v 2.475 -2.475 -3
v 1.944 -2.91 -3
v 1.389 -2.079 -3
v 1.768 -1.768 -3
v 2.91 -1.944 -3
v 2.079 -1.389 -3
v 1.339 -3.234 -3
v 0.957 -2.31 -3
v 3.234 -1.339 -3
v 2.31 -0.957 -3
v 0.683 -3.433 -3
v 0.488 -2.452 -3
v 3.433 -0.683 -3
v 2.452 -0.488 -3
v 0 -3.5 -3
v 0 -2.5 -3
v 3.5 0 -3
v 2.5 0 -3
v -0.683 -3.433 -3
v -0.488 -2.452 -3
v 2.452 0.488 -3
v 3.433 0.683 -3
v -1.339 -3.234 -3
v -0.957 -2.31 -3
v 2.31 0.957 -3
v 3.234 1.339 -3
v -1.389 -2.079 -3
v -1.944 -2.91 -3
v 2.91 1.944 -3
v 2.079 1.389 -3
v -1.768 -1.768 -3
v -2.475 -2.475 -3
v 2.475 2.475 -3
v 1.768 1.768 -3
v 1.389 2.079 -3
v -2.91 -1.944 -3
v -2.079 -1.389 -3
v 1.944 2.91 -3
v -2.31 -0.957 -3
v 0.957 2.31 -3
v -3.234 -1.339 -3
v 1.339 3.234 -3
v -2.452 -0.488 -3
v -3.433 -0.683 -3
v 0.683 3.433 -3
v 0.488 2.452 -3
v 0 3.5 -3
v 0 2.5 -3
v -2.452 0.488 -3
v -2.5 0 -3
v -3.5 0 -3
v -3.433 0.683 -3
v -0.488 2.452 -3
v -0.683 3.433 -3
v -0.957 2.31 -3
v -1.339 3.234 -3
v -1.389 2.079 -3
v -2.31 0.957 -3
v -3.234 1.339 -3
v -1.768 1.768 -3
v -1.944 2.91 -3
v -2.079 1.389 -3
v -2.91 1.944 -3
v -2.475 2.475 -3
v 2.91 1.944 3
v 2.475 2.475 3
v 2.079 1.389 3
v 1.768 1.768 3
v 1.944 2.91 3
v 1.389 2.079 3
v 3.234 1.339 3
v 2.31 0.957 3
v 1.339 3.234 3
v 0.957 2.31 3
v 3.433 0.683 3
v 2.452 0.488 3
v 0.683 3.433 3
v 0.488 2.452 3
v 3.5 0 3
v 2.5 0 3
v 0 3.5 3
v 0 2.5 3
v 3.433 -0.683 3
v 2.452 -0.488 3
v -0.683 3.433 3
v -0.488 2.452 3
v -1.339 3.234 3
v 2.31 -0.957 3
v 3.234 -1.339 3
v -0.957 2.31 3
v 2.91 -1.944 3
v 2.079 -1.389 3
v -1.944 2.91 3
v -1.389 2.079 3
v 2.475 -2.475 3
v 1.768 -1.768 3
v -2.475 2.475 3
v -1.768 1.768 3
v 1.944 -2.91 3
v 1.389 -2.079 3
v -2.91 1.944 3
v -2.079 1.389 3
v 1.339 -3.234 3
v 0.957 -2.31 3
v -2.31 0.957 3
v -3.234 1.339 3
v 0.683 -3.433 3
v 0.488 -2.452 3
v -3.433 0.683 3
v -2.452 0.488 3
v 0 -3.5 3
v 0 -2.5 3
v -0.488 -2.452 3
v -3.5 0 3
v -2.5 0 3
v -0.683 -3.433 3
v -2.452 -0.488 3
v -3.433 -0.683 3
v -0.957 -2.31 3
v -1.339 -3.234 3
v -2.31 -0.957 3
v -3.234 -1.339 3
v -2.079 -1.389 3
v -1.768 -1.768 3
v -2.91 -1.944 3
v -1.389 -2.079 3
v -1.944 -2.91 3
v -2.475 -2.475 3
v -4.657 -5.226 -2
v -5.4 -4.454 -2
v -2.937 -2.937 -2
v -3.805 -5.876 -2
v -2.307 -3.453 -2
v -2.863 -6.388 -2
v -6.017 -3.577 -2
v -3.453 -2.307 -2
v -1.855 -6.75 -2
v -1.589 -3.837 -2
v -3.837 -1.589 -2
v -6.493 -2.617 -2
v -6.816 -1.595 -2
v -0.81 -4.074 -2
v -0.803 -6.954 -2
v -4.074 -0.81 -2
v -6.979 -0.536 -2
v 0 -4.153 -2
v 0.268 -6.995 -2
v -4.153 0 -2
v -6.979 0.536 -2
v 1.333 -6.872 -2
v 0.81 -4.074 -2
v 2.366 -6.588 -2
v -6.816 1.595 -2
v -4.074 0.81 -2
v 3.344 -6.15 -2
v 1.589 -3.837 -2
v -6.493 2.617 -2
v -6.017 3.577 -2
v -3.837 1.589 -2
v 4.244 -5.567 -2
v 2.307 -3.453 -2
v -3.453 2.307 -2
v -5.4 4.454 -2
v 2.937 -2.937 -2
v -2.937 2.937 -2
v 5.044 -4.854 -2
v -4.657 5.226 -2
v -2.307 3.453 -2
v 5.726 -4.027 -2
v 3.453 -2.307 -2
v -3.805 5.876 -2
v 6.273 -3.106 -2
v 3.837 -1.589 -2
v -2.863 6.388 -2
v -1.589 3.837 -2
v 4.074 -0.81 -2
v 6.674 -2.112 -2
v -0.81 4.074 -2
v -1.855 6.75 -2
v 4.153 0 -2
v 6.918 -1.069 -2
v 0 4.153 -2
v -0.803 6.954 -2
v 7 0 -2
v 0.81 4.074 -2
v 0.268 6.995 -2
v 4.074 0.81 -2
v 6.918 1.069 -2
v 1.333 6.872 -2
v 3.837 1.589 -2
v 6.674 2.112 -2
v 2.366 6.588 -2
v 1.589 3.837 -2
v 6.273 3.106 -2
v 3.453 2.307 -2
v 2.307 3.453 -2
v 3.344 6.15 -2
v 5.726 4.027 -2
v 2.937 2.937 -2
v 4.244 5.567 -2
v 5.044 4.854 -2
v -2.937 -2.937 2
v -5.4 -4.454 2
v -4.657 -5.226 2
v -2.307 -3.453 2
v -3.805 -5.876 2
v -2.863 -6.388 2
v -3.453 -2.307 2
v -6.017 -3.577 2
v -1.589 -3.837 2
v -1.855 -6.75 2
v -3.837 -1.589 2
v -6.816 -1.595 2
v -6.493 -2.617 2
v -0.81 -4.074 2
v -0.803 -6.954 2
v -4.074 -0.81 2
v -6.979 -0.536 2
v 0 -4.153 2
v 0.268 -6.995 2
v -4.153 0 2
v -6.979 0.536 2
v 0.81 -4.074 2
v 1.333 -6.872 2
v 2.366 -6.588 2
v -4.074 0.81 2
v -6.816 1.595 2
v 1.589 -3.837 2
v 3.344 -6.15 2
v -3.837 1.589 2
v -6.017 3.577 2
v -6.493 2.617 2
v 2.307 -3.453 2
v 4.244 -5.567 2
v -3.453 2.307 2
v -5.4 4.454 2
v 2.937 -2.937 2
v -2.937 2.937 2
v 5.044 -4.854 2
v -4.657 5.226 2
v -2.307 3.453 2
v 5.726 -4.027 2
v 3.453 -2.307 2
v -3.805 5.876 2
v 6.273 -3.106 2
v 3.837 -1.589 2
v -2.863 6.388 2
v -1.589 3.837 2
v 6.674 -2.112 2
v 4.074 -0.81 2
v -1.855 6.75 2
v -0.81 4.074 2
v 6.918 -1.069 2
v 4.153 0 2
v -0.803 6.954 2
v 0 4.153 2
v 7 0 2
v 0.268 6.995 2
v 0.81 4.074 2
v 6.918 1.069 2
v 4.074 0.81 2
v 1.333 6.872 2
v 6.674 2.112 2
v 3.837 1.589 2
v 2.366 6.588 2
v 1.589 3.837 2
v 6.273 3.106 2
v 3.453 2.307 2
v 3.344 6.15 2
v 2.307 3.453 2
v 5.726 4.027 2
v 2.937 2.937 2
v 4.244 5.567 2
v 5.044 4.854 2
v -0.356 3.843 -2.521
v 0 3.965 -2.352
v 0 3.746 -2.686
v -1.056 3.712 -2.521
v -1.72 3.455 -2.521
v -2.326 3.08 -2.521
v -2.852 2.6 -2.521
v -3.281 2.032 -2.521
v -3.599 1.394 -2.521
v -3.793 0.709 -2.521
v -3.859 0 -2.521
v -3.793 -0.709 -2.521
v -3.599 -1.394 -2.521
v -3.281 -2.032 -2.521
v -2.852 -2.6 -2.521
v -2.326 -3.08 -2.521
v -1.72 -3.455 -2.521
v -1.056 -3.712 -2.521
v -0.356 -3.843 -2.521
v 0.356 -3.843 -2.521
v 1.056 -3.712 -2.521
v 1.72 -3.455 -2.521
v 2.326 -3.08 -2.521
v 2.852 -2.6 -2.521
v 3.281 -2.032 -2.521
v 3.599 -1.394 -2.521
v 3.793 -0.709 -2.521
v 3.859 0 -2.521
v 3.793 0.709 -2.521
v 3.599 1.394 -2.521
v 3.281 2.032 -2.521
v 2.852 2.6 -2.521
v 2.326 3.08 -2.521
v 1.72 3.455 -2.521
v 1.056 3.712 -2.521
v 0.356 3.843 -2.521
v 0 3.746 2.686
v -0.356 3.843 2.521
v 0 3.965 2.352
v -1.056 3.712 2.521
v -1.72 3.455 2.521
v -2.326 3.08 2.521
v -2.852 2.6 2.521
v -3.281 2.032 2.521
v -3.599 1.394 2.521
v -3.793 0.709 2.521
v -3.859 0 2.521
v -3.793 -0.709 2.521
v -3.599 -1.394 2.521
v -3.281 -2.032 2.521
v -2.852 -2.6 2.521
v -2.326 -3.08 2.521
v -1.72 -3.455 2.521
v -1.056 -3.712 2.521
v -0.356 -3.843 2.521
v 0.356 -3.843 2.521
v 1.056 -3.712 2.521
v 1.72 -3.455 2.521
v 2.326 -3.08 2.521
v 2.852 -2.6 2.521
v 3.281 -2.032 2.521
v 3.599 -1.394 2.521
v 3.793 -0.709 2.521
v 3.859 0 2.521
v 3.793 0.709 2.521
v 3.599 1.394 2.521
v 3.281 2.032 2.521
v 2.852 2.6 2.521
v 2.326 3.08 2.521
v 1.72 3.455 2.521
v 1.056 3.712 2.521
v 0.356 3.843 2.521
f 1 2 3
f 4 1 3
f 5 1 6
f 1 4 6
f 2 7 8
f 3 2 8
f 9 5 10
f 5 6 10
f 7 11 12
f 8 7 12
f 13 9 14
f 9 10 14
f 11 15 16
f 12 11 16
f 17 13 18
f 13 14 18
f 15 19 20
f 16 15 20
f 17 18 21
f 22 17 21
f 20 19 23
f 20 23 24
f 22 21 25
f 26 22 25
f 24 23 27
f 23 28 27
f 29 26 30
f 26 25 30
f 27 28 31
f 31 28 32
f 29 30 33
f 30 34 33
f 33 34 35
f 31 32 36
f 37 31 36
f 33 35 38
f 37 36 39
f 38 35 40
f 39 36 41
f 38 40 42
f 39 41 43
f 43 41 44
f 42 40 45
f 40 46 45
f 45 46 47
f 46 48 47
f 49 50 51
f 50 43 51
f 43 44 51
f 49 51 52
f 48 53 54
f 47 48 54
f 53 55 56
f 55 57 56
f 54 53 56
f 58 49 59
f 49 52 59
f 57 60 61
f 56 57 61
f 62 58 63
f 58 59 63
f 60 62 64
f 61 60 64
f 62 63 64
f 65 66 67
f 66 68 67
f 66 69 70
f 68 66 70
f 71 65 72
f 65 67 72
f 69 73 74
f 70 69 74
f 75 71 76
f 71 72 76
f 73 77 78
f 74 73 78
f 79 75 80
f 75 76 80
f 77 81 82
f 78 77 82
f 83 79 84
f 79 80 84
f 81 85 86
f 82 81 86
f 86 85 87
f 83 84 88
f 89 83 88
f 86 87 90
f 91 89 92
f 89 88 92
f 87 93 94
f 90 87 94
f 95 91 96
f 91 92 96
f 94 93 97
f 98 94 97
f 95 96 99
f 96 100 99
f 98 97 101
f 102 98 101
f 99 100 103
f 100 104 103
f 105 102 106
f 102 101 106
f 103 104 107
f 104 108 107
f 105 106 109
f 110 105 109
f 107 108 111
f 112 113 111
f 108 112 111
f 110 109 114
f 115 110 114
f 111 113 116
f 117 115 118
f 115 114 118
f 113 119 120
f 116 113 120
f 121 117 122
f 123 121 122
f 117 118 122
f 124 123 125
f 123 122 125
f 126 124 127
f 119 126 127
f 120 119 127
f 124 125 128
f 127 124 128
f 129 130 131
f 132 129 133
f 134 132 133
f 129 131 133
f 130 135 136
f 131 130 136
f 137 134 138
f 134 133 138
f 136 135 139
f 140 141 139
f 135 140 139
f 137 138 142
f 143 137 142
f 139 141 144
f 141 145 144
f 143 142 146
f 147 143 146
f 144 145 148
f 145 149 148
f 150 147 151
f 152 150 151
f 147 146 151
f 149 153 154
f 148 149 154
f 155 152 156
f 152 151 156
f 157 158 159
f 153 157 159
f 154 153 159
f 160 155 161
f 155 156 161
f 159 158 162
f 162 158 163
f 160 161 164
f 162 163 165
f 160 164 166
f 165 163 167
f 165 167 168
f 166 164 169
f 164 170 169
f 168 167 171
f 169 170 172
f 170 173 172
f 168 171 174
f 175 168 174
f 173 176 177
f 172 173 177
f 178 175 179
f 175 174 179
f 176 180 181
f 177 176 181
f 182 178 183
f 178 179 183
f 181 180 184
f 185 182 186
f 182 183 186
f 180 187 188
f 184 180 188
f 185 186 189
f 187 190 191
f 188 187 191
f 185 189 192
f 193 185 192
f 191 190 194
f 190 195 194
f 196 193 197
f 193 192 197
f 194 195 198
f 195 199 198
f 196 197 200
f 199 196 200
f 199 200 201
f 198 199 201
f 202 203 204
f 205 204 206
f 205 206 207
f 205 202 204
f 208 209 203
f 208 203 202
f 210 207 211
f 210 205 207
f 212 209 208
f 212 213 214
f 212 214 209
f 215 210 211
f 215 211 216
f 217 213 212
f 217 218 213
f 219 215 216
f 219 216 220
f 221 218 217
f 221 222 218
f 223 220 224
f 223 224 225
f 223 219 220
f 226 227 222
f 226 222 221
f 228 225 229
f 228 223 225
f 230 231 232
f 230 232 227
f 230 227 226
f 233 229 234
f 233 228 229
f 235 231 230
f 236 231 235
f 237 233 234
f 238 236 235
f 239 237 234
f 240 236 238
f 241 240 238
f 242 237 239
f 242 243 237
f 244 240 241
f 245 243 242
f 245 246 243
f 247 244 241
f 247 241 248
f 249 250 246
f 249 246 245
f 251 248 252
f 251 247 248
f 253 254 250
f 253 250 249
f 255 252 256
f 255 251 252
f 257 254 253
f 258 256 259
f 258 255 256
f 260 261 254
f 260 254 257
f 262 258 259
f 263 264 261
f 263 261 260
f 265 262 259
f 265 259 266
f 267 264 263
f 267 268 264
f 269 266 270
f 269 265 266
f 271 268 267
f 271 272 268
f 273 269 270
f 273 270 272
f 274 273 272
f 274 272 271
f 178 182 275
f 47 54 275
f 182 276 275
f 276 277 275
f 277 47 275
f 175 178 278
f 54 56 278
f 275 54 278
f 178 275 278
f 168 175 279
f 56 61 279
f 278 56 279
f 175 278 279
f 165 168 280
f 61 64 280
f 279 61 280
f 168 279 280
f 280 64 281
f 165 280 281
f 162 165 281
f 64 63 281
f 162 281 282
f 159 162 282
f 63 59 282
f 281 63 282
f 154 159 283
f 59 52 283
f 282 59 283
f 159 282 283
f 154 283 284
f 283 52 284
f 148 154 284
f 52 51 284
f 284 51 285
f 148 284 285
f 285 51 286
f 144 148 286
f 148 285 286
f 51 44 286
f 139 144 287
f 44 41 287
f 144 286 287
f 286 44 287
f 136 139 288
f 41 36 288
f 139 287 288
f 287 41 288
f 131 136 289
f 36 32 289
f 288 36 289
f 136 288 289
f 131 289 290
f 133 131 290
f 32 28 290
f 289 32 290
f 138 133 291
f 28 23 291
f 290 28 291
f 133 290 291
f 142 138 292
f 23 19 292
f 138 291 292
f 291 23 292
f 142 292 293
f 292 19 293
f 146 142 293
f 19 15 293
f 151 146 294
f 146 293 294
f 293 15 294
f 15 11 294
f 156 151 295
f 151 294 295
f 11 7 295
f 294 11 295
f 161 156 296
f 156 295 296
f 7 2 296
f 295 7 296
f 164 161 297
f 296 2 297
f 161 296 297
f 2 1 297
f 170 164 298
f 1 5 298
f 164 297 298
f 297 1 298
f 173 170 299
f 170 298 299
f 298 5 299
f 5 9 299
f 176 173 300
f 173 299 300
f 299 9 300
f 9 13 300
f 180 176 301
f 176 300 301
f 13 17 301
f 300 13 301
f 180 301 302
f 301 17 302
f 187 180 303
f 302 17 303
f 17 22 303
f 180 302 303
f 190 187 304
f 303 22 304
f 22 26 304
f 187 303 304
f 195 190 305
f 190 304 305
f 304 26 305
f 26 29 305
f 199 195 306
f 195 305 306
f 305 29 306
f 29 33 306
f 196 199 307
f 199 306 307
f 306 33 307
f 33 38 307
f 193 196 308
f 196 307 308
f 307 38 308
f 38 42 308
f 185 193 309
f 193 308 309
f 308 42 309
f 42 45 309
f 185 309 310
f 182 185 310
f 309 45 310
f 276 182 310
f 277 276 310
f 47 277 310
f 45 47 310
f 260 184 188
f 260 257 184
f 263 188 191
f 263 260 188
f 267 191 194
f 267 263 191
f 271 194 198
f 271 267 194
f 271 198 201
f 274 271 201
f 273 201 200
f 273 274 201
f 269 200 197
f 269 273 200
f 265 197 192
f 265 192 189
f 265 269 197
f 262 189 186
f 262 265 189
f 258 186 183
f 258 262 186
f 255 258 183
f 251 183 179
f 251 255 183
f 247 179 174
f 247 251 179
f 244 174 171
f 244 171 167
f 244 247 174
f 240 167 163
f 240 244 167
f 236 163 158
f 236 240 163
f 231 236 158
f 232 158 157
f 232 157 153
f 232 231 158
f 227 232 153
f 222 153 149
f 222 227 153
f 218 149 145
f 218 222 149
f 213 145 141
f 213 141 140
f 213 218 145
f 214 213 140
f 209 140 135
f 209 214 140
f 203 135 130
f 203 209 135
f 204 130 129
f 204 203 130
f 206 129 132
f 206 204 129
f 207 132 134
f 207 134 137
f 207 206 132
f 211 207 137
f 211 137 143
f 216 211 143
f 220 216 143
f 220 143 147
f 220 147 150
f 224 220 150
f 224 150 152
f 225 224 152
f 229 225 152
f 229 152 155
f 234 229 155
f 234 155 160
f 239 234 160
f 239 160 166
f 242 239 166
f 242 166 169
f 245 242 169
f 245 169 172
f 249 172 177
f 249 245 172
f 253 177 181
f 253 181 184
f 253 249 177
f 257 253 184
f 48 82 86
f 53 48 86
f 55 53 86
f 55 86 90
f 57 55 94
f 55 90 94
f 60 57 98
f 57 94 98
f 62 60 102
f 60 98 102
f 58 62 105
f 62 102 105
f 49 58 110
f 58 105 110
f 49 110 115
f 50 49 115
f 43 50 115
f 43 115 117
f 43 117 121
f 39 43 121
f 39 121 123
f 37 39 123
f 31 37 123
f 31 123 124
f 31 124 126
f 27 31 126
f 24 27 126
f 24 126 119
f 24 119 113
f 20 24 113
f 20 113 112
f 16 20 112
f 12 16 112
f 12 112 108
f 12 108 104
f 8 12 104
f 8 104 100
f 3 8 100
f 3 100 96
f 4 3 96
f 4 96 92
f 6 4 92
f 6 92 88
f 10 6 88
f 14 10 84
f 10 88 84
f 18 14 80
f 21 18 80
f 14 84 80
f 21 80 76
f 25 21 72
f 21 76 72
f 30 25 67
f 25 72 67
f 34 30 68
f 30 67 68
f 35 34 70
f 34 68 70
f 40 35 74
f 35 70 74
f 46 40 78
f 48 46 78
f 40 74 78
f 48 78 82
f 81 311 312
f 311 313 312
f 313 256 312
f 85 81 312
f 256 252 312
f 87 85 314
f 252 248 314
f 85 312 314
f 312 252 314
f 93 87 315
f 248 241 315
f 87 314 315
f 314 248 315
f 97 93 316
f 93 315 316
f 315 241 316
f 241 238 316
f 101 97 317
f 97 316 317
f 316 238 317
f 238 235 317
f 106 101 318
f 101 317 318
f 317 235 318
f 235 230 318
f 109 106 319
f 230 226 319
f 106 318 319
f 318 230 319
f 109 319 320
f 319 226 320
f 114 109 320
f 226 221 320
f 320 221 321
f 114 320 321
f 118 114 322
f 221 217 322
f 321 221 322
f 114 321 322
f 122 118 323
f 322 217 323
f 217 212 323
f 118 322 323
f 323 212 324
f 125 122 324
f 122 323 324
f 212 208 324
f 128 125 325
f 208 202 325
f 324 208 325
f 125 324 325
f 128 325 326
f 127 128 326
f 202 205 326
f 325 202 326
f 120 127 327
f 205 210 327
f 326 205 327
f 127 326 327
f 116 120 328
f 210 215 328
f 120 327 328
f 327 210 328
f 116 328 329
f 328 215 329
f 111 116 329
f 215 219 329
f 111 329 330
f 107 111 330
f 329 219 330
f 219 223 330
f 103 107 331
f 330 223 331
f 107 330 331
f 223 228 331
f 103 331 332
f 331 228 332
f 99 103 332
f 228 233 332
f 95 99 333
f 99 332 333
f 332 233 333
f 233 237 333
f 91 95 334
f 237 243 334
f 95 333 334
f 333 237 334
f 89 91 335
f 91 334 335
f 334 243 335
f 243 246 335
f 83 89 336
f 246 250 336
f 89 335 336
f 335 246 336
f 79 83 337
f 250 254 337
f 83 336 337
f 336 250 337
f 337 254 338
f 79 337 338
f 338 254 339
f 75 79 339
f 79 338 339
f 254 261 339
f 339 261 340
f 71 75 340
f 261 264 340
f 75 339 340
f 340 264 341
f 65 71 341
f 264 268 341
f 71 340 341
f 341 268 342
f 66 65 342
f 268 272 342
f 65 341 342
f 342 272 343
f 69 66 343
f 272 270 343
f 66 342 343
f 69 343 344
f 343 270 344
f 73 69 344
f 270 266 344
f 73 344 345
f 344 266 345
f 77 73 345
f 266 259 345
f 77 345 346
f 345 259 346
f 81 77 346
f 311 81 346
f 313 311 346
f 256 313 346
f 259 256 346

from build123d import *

# Parameters (mm, degrees)
SKETCH_1_R      = 7
SKETCH_1_R_2    = 2.5
EXTRUDE_1_DEPTH = 2


with BuildPart() as part:
    # 草图1 → 凸台-拉伸1 (new, symmetric)
    with BuildSketch(Plane.XY):
        Circle(SKETCH_1_R)
        Circle(SKETCH_1_R_2, mode=Mode.SUBTRACT)
    extrude(amount=EXTRUDE_1_DEPTH, both=True)

    # 草图2 → 旋转1 (revolve)
    with BuildSketch(Plane(origin=(0, 0, 0), x_dir=(0, 0, -1), z_dir=(1, 0, 0))):
        with BuildLine():
            ThreePointArc((-3, 3.5), (0, 4.609772229), (3, 3.5))
            Line((3, 3.5), (3, 2.5))
            Line((3, 2.5), (-3, 2.5))
            Line((-3, 2.5), (-3, 3.5))
        make_face()
    revolve(axis=Axis((0, 0, 0), (0, 0, 1)))


solid = part.part
